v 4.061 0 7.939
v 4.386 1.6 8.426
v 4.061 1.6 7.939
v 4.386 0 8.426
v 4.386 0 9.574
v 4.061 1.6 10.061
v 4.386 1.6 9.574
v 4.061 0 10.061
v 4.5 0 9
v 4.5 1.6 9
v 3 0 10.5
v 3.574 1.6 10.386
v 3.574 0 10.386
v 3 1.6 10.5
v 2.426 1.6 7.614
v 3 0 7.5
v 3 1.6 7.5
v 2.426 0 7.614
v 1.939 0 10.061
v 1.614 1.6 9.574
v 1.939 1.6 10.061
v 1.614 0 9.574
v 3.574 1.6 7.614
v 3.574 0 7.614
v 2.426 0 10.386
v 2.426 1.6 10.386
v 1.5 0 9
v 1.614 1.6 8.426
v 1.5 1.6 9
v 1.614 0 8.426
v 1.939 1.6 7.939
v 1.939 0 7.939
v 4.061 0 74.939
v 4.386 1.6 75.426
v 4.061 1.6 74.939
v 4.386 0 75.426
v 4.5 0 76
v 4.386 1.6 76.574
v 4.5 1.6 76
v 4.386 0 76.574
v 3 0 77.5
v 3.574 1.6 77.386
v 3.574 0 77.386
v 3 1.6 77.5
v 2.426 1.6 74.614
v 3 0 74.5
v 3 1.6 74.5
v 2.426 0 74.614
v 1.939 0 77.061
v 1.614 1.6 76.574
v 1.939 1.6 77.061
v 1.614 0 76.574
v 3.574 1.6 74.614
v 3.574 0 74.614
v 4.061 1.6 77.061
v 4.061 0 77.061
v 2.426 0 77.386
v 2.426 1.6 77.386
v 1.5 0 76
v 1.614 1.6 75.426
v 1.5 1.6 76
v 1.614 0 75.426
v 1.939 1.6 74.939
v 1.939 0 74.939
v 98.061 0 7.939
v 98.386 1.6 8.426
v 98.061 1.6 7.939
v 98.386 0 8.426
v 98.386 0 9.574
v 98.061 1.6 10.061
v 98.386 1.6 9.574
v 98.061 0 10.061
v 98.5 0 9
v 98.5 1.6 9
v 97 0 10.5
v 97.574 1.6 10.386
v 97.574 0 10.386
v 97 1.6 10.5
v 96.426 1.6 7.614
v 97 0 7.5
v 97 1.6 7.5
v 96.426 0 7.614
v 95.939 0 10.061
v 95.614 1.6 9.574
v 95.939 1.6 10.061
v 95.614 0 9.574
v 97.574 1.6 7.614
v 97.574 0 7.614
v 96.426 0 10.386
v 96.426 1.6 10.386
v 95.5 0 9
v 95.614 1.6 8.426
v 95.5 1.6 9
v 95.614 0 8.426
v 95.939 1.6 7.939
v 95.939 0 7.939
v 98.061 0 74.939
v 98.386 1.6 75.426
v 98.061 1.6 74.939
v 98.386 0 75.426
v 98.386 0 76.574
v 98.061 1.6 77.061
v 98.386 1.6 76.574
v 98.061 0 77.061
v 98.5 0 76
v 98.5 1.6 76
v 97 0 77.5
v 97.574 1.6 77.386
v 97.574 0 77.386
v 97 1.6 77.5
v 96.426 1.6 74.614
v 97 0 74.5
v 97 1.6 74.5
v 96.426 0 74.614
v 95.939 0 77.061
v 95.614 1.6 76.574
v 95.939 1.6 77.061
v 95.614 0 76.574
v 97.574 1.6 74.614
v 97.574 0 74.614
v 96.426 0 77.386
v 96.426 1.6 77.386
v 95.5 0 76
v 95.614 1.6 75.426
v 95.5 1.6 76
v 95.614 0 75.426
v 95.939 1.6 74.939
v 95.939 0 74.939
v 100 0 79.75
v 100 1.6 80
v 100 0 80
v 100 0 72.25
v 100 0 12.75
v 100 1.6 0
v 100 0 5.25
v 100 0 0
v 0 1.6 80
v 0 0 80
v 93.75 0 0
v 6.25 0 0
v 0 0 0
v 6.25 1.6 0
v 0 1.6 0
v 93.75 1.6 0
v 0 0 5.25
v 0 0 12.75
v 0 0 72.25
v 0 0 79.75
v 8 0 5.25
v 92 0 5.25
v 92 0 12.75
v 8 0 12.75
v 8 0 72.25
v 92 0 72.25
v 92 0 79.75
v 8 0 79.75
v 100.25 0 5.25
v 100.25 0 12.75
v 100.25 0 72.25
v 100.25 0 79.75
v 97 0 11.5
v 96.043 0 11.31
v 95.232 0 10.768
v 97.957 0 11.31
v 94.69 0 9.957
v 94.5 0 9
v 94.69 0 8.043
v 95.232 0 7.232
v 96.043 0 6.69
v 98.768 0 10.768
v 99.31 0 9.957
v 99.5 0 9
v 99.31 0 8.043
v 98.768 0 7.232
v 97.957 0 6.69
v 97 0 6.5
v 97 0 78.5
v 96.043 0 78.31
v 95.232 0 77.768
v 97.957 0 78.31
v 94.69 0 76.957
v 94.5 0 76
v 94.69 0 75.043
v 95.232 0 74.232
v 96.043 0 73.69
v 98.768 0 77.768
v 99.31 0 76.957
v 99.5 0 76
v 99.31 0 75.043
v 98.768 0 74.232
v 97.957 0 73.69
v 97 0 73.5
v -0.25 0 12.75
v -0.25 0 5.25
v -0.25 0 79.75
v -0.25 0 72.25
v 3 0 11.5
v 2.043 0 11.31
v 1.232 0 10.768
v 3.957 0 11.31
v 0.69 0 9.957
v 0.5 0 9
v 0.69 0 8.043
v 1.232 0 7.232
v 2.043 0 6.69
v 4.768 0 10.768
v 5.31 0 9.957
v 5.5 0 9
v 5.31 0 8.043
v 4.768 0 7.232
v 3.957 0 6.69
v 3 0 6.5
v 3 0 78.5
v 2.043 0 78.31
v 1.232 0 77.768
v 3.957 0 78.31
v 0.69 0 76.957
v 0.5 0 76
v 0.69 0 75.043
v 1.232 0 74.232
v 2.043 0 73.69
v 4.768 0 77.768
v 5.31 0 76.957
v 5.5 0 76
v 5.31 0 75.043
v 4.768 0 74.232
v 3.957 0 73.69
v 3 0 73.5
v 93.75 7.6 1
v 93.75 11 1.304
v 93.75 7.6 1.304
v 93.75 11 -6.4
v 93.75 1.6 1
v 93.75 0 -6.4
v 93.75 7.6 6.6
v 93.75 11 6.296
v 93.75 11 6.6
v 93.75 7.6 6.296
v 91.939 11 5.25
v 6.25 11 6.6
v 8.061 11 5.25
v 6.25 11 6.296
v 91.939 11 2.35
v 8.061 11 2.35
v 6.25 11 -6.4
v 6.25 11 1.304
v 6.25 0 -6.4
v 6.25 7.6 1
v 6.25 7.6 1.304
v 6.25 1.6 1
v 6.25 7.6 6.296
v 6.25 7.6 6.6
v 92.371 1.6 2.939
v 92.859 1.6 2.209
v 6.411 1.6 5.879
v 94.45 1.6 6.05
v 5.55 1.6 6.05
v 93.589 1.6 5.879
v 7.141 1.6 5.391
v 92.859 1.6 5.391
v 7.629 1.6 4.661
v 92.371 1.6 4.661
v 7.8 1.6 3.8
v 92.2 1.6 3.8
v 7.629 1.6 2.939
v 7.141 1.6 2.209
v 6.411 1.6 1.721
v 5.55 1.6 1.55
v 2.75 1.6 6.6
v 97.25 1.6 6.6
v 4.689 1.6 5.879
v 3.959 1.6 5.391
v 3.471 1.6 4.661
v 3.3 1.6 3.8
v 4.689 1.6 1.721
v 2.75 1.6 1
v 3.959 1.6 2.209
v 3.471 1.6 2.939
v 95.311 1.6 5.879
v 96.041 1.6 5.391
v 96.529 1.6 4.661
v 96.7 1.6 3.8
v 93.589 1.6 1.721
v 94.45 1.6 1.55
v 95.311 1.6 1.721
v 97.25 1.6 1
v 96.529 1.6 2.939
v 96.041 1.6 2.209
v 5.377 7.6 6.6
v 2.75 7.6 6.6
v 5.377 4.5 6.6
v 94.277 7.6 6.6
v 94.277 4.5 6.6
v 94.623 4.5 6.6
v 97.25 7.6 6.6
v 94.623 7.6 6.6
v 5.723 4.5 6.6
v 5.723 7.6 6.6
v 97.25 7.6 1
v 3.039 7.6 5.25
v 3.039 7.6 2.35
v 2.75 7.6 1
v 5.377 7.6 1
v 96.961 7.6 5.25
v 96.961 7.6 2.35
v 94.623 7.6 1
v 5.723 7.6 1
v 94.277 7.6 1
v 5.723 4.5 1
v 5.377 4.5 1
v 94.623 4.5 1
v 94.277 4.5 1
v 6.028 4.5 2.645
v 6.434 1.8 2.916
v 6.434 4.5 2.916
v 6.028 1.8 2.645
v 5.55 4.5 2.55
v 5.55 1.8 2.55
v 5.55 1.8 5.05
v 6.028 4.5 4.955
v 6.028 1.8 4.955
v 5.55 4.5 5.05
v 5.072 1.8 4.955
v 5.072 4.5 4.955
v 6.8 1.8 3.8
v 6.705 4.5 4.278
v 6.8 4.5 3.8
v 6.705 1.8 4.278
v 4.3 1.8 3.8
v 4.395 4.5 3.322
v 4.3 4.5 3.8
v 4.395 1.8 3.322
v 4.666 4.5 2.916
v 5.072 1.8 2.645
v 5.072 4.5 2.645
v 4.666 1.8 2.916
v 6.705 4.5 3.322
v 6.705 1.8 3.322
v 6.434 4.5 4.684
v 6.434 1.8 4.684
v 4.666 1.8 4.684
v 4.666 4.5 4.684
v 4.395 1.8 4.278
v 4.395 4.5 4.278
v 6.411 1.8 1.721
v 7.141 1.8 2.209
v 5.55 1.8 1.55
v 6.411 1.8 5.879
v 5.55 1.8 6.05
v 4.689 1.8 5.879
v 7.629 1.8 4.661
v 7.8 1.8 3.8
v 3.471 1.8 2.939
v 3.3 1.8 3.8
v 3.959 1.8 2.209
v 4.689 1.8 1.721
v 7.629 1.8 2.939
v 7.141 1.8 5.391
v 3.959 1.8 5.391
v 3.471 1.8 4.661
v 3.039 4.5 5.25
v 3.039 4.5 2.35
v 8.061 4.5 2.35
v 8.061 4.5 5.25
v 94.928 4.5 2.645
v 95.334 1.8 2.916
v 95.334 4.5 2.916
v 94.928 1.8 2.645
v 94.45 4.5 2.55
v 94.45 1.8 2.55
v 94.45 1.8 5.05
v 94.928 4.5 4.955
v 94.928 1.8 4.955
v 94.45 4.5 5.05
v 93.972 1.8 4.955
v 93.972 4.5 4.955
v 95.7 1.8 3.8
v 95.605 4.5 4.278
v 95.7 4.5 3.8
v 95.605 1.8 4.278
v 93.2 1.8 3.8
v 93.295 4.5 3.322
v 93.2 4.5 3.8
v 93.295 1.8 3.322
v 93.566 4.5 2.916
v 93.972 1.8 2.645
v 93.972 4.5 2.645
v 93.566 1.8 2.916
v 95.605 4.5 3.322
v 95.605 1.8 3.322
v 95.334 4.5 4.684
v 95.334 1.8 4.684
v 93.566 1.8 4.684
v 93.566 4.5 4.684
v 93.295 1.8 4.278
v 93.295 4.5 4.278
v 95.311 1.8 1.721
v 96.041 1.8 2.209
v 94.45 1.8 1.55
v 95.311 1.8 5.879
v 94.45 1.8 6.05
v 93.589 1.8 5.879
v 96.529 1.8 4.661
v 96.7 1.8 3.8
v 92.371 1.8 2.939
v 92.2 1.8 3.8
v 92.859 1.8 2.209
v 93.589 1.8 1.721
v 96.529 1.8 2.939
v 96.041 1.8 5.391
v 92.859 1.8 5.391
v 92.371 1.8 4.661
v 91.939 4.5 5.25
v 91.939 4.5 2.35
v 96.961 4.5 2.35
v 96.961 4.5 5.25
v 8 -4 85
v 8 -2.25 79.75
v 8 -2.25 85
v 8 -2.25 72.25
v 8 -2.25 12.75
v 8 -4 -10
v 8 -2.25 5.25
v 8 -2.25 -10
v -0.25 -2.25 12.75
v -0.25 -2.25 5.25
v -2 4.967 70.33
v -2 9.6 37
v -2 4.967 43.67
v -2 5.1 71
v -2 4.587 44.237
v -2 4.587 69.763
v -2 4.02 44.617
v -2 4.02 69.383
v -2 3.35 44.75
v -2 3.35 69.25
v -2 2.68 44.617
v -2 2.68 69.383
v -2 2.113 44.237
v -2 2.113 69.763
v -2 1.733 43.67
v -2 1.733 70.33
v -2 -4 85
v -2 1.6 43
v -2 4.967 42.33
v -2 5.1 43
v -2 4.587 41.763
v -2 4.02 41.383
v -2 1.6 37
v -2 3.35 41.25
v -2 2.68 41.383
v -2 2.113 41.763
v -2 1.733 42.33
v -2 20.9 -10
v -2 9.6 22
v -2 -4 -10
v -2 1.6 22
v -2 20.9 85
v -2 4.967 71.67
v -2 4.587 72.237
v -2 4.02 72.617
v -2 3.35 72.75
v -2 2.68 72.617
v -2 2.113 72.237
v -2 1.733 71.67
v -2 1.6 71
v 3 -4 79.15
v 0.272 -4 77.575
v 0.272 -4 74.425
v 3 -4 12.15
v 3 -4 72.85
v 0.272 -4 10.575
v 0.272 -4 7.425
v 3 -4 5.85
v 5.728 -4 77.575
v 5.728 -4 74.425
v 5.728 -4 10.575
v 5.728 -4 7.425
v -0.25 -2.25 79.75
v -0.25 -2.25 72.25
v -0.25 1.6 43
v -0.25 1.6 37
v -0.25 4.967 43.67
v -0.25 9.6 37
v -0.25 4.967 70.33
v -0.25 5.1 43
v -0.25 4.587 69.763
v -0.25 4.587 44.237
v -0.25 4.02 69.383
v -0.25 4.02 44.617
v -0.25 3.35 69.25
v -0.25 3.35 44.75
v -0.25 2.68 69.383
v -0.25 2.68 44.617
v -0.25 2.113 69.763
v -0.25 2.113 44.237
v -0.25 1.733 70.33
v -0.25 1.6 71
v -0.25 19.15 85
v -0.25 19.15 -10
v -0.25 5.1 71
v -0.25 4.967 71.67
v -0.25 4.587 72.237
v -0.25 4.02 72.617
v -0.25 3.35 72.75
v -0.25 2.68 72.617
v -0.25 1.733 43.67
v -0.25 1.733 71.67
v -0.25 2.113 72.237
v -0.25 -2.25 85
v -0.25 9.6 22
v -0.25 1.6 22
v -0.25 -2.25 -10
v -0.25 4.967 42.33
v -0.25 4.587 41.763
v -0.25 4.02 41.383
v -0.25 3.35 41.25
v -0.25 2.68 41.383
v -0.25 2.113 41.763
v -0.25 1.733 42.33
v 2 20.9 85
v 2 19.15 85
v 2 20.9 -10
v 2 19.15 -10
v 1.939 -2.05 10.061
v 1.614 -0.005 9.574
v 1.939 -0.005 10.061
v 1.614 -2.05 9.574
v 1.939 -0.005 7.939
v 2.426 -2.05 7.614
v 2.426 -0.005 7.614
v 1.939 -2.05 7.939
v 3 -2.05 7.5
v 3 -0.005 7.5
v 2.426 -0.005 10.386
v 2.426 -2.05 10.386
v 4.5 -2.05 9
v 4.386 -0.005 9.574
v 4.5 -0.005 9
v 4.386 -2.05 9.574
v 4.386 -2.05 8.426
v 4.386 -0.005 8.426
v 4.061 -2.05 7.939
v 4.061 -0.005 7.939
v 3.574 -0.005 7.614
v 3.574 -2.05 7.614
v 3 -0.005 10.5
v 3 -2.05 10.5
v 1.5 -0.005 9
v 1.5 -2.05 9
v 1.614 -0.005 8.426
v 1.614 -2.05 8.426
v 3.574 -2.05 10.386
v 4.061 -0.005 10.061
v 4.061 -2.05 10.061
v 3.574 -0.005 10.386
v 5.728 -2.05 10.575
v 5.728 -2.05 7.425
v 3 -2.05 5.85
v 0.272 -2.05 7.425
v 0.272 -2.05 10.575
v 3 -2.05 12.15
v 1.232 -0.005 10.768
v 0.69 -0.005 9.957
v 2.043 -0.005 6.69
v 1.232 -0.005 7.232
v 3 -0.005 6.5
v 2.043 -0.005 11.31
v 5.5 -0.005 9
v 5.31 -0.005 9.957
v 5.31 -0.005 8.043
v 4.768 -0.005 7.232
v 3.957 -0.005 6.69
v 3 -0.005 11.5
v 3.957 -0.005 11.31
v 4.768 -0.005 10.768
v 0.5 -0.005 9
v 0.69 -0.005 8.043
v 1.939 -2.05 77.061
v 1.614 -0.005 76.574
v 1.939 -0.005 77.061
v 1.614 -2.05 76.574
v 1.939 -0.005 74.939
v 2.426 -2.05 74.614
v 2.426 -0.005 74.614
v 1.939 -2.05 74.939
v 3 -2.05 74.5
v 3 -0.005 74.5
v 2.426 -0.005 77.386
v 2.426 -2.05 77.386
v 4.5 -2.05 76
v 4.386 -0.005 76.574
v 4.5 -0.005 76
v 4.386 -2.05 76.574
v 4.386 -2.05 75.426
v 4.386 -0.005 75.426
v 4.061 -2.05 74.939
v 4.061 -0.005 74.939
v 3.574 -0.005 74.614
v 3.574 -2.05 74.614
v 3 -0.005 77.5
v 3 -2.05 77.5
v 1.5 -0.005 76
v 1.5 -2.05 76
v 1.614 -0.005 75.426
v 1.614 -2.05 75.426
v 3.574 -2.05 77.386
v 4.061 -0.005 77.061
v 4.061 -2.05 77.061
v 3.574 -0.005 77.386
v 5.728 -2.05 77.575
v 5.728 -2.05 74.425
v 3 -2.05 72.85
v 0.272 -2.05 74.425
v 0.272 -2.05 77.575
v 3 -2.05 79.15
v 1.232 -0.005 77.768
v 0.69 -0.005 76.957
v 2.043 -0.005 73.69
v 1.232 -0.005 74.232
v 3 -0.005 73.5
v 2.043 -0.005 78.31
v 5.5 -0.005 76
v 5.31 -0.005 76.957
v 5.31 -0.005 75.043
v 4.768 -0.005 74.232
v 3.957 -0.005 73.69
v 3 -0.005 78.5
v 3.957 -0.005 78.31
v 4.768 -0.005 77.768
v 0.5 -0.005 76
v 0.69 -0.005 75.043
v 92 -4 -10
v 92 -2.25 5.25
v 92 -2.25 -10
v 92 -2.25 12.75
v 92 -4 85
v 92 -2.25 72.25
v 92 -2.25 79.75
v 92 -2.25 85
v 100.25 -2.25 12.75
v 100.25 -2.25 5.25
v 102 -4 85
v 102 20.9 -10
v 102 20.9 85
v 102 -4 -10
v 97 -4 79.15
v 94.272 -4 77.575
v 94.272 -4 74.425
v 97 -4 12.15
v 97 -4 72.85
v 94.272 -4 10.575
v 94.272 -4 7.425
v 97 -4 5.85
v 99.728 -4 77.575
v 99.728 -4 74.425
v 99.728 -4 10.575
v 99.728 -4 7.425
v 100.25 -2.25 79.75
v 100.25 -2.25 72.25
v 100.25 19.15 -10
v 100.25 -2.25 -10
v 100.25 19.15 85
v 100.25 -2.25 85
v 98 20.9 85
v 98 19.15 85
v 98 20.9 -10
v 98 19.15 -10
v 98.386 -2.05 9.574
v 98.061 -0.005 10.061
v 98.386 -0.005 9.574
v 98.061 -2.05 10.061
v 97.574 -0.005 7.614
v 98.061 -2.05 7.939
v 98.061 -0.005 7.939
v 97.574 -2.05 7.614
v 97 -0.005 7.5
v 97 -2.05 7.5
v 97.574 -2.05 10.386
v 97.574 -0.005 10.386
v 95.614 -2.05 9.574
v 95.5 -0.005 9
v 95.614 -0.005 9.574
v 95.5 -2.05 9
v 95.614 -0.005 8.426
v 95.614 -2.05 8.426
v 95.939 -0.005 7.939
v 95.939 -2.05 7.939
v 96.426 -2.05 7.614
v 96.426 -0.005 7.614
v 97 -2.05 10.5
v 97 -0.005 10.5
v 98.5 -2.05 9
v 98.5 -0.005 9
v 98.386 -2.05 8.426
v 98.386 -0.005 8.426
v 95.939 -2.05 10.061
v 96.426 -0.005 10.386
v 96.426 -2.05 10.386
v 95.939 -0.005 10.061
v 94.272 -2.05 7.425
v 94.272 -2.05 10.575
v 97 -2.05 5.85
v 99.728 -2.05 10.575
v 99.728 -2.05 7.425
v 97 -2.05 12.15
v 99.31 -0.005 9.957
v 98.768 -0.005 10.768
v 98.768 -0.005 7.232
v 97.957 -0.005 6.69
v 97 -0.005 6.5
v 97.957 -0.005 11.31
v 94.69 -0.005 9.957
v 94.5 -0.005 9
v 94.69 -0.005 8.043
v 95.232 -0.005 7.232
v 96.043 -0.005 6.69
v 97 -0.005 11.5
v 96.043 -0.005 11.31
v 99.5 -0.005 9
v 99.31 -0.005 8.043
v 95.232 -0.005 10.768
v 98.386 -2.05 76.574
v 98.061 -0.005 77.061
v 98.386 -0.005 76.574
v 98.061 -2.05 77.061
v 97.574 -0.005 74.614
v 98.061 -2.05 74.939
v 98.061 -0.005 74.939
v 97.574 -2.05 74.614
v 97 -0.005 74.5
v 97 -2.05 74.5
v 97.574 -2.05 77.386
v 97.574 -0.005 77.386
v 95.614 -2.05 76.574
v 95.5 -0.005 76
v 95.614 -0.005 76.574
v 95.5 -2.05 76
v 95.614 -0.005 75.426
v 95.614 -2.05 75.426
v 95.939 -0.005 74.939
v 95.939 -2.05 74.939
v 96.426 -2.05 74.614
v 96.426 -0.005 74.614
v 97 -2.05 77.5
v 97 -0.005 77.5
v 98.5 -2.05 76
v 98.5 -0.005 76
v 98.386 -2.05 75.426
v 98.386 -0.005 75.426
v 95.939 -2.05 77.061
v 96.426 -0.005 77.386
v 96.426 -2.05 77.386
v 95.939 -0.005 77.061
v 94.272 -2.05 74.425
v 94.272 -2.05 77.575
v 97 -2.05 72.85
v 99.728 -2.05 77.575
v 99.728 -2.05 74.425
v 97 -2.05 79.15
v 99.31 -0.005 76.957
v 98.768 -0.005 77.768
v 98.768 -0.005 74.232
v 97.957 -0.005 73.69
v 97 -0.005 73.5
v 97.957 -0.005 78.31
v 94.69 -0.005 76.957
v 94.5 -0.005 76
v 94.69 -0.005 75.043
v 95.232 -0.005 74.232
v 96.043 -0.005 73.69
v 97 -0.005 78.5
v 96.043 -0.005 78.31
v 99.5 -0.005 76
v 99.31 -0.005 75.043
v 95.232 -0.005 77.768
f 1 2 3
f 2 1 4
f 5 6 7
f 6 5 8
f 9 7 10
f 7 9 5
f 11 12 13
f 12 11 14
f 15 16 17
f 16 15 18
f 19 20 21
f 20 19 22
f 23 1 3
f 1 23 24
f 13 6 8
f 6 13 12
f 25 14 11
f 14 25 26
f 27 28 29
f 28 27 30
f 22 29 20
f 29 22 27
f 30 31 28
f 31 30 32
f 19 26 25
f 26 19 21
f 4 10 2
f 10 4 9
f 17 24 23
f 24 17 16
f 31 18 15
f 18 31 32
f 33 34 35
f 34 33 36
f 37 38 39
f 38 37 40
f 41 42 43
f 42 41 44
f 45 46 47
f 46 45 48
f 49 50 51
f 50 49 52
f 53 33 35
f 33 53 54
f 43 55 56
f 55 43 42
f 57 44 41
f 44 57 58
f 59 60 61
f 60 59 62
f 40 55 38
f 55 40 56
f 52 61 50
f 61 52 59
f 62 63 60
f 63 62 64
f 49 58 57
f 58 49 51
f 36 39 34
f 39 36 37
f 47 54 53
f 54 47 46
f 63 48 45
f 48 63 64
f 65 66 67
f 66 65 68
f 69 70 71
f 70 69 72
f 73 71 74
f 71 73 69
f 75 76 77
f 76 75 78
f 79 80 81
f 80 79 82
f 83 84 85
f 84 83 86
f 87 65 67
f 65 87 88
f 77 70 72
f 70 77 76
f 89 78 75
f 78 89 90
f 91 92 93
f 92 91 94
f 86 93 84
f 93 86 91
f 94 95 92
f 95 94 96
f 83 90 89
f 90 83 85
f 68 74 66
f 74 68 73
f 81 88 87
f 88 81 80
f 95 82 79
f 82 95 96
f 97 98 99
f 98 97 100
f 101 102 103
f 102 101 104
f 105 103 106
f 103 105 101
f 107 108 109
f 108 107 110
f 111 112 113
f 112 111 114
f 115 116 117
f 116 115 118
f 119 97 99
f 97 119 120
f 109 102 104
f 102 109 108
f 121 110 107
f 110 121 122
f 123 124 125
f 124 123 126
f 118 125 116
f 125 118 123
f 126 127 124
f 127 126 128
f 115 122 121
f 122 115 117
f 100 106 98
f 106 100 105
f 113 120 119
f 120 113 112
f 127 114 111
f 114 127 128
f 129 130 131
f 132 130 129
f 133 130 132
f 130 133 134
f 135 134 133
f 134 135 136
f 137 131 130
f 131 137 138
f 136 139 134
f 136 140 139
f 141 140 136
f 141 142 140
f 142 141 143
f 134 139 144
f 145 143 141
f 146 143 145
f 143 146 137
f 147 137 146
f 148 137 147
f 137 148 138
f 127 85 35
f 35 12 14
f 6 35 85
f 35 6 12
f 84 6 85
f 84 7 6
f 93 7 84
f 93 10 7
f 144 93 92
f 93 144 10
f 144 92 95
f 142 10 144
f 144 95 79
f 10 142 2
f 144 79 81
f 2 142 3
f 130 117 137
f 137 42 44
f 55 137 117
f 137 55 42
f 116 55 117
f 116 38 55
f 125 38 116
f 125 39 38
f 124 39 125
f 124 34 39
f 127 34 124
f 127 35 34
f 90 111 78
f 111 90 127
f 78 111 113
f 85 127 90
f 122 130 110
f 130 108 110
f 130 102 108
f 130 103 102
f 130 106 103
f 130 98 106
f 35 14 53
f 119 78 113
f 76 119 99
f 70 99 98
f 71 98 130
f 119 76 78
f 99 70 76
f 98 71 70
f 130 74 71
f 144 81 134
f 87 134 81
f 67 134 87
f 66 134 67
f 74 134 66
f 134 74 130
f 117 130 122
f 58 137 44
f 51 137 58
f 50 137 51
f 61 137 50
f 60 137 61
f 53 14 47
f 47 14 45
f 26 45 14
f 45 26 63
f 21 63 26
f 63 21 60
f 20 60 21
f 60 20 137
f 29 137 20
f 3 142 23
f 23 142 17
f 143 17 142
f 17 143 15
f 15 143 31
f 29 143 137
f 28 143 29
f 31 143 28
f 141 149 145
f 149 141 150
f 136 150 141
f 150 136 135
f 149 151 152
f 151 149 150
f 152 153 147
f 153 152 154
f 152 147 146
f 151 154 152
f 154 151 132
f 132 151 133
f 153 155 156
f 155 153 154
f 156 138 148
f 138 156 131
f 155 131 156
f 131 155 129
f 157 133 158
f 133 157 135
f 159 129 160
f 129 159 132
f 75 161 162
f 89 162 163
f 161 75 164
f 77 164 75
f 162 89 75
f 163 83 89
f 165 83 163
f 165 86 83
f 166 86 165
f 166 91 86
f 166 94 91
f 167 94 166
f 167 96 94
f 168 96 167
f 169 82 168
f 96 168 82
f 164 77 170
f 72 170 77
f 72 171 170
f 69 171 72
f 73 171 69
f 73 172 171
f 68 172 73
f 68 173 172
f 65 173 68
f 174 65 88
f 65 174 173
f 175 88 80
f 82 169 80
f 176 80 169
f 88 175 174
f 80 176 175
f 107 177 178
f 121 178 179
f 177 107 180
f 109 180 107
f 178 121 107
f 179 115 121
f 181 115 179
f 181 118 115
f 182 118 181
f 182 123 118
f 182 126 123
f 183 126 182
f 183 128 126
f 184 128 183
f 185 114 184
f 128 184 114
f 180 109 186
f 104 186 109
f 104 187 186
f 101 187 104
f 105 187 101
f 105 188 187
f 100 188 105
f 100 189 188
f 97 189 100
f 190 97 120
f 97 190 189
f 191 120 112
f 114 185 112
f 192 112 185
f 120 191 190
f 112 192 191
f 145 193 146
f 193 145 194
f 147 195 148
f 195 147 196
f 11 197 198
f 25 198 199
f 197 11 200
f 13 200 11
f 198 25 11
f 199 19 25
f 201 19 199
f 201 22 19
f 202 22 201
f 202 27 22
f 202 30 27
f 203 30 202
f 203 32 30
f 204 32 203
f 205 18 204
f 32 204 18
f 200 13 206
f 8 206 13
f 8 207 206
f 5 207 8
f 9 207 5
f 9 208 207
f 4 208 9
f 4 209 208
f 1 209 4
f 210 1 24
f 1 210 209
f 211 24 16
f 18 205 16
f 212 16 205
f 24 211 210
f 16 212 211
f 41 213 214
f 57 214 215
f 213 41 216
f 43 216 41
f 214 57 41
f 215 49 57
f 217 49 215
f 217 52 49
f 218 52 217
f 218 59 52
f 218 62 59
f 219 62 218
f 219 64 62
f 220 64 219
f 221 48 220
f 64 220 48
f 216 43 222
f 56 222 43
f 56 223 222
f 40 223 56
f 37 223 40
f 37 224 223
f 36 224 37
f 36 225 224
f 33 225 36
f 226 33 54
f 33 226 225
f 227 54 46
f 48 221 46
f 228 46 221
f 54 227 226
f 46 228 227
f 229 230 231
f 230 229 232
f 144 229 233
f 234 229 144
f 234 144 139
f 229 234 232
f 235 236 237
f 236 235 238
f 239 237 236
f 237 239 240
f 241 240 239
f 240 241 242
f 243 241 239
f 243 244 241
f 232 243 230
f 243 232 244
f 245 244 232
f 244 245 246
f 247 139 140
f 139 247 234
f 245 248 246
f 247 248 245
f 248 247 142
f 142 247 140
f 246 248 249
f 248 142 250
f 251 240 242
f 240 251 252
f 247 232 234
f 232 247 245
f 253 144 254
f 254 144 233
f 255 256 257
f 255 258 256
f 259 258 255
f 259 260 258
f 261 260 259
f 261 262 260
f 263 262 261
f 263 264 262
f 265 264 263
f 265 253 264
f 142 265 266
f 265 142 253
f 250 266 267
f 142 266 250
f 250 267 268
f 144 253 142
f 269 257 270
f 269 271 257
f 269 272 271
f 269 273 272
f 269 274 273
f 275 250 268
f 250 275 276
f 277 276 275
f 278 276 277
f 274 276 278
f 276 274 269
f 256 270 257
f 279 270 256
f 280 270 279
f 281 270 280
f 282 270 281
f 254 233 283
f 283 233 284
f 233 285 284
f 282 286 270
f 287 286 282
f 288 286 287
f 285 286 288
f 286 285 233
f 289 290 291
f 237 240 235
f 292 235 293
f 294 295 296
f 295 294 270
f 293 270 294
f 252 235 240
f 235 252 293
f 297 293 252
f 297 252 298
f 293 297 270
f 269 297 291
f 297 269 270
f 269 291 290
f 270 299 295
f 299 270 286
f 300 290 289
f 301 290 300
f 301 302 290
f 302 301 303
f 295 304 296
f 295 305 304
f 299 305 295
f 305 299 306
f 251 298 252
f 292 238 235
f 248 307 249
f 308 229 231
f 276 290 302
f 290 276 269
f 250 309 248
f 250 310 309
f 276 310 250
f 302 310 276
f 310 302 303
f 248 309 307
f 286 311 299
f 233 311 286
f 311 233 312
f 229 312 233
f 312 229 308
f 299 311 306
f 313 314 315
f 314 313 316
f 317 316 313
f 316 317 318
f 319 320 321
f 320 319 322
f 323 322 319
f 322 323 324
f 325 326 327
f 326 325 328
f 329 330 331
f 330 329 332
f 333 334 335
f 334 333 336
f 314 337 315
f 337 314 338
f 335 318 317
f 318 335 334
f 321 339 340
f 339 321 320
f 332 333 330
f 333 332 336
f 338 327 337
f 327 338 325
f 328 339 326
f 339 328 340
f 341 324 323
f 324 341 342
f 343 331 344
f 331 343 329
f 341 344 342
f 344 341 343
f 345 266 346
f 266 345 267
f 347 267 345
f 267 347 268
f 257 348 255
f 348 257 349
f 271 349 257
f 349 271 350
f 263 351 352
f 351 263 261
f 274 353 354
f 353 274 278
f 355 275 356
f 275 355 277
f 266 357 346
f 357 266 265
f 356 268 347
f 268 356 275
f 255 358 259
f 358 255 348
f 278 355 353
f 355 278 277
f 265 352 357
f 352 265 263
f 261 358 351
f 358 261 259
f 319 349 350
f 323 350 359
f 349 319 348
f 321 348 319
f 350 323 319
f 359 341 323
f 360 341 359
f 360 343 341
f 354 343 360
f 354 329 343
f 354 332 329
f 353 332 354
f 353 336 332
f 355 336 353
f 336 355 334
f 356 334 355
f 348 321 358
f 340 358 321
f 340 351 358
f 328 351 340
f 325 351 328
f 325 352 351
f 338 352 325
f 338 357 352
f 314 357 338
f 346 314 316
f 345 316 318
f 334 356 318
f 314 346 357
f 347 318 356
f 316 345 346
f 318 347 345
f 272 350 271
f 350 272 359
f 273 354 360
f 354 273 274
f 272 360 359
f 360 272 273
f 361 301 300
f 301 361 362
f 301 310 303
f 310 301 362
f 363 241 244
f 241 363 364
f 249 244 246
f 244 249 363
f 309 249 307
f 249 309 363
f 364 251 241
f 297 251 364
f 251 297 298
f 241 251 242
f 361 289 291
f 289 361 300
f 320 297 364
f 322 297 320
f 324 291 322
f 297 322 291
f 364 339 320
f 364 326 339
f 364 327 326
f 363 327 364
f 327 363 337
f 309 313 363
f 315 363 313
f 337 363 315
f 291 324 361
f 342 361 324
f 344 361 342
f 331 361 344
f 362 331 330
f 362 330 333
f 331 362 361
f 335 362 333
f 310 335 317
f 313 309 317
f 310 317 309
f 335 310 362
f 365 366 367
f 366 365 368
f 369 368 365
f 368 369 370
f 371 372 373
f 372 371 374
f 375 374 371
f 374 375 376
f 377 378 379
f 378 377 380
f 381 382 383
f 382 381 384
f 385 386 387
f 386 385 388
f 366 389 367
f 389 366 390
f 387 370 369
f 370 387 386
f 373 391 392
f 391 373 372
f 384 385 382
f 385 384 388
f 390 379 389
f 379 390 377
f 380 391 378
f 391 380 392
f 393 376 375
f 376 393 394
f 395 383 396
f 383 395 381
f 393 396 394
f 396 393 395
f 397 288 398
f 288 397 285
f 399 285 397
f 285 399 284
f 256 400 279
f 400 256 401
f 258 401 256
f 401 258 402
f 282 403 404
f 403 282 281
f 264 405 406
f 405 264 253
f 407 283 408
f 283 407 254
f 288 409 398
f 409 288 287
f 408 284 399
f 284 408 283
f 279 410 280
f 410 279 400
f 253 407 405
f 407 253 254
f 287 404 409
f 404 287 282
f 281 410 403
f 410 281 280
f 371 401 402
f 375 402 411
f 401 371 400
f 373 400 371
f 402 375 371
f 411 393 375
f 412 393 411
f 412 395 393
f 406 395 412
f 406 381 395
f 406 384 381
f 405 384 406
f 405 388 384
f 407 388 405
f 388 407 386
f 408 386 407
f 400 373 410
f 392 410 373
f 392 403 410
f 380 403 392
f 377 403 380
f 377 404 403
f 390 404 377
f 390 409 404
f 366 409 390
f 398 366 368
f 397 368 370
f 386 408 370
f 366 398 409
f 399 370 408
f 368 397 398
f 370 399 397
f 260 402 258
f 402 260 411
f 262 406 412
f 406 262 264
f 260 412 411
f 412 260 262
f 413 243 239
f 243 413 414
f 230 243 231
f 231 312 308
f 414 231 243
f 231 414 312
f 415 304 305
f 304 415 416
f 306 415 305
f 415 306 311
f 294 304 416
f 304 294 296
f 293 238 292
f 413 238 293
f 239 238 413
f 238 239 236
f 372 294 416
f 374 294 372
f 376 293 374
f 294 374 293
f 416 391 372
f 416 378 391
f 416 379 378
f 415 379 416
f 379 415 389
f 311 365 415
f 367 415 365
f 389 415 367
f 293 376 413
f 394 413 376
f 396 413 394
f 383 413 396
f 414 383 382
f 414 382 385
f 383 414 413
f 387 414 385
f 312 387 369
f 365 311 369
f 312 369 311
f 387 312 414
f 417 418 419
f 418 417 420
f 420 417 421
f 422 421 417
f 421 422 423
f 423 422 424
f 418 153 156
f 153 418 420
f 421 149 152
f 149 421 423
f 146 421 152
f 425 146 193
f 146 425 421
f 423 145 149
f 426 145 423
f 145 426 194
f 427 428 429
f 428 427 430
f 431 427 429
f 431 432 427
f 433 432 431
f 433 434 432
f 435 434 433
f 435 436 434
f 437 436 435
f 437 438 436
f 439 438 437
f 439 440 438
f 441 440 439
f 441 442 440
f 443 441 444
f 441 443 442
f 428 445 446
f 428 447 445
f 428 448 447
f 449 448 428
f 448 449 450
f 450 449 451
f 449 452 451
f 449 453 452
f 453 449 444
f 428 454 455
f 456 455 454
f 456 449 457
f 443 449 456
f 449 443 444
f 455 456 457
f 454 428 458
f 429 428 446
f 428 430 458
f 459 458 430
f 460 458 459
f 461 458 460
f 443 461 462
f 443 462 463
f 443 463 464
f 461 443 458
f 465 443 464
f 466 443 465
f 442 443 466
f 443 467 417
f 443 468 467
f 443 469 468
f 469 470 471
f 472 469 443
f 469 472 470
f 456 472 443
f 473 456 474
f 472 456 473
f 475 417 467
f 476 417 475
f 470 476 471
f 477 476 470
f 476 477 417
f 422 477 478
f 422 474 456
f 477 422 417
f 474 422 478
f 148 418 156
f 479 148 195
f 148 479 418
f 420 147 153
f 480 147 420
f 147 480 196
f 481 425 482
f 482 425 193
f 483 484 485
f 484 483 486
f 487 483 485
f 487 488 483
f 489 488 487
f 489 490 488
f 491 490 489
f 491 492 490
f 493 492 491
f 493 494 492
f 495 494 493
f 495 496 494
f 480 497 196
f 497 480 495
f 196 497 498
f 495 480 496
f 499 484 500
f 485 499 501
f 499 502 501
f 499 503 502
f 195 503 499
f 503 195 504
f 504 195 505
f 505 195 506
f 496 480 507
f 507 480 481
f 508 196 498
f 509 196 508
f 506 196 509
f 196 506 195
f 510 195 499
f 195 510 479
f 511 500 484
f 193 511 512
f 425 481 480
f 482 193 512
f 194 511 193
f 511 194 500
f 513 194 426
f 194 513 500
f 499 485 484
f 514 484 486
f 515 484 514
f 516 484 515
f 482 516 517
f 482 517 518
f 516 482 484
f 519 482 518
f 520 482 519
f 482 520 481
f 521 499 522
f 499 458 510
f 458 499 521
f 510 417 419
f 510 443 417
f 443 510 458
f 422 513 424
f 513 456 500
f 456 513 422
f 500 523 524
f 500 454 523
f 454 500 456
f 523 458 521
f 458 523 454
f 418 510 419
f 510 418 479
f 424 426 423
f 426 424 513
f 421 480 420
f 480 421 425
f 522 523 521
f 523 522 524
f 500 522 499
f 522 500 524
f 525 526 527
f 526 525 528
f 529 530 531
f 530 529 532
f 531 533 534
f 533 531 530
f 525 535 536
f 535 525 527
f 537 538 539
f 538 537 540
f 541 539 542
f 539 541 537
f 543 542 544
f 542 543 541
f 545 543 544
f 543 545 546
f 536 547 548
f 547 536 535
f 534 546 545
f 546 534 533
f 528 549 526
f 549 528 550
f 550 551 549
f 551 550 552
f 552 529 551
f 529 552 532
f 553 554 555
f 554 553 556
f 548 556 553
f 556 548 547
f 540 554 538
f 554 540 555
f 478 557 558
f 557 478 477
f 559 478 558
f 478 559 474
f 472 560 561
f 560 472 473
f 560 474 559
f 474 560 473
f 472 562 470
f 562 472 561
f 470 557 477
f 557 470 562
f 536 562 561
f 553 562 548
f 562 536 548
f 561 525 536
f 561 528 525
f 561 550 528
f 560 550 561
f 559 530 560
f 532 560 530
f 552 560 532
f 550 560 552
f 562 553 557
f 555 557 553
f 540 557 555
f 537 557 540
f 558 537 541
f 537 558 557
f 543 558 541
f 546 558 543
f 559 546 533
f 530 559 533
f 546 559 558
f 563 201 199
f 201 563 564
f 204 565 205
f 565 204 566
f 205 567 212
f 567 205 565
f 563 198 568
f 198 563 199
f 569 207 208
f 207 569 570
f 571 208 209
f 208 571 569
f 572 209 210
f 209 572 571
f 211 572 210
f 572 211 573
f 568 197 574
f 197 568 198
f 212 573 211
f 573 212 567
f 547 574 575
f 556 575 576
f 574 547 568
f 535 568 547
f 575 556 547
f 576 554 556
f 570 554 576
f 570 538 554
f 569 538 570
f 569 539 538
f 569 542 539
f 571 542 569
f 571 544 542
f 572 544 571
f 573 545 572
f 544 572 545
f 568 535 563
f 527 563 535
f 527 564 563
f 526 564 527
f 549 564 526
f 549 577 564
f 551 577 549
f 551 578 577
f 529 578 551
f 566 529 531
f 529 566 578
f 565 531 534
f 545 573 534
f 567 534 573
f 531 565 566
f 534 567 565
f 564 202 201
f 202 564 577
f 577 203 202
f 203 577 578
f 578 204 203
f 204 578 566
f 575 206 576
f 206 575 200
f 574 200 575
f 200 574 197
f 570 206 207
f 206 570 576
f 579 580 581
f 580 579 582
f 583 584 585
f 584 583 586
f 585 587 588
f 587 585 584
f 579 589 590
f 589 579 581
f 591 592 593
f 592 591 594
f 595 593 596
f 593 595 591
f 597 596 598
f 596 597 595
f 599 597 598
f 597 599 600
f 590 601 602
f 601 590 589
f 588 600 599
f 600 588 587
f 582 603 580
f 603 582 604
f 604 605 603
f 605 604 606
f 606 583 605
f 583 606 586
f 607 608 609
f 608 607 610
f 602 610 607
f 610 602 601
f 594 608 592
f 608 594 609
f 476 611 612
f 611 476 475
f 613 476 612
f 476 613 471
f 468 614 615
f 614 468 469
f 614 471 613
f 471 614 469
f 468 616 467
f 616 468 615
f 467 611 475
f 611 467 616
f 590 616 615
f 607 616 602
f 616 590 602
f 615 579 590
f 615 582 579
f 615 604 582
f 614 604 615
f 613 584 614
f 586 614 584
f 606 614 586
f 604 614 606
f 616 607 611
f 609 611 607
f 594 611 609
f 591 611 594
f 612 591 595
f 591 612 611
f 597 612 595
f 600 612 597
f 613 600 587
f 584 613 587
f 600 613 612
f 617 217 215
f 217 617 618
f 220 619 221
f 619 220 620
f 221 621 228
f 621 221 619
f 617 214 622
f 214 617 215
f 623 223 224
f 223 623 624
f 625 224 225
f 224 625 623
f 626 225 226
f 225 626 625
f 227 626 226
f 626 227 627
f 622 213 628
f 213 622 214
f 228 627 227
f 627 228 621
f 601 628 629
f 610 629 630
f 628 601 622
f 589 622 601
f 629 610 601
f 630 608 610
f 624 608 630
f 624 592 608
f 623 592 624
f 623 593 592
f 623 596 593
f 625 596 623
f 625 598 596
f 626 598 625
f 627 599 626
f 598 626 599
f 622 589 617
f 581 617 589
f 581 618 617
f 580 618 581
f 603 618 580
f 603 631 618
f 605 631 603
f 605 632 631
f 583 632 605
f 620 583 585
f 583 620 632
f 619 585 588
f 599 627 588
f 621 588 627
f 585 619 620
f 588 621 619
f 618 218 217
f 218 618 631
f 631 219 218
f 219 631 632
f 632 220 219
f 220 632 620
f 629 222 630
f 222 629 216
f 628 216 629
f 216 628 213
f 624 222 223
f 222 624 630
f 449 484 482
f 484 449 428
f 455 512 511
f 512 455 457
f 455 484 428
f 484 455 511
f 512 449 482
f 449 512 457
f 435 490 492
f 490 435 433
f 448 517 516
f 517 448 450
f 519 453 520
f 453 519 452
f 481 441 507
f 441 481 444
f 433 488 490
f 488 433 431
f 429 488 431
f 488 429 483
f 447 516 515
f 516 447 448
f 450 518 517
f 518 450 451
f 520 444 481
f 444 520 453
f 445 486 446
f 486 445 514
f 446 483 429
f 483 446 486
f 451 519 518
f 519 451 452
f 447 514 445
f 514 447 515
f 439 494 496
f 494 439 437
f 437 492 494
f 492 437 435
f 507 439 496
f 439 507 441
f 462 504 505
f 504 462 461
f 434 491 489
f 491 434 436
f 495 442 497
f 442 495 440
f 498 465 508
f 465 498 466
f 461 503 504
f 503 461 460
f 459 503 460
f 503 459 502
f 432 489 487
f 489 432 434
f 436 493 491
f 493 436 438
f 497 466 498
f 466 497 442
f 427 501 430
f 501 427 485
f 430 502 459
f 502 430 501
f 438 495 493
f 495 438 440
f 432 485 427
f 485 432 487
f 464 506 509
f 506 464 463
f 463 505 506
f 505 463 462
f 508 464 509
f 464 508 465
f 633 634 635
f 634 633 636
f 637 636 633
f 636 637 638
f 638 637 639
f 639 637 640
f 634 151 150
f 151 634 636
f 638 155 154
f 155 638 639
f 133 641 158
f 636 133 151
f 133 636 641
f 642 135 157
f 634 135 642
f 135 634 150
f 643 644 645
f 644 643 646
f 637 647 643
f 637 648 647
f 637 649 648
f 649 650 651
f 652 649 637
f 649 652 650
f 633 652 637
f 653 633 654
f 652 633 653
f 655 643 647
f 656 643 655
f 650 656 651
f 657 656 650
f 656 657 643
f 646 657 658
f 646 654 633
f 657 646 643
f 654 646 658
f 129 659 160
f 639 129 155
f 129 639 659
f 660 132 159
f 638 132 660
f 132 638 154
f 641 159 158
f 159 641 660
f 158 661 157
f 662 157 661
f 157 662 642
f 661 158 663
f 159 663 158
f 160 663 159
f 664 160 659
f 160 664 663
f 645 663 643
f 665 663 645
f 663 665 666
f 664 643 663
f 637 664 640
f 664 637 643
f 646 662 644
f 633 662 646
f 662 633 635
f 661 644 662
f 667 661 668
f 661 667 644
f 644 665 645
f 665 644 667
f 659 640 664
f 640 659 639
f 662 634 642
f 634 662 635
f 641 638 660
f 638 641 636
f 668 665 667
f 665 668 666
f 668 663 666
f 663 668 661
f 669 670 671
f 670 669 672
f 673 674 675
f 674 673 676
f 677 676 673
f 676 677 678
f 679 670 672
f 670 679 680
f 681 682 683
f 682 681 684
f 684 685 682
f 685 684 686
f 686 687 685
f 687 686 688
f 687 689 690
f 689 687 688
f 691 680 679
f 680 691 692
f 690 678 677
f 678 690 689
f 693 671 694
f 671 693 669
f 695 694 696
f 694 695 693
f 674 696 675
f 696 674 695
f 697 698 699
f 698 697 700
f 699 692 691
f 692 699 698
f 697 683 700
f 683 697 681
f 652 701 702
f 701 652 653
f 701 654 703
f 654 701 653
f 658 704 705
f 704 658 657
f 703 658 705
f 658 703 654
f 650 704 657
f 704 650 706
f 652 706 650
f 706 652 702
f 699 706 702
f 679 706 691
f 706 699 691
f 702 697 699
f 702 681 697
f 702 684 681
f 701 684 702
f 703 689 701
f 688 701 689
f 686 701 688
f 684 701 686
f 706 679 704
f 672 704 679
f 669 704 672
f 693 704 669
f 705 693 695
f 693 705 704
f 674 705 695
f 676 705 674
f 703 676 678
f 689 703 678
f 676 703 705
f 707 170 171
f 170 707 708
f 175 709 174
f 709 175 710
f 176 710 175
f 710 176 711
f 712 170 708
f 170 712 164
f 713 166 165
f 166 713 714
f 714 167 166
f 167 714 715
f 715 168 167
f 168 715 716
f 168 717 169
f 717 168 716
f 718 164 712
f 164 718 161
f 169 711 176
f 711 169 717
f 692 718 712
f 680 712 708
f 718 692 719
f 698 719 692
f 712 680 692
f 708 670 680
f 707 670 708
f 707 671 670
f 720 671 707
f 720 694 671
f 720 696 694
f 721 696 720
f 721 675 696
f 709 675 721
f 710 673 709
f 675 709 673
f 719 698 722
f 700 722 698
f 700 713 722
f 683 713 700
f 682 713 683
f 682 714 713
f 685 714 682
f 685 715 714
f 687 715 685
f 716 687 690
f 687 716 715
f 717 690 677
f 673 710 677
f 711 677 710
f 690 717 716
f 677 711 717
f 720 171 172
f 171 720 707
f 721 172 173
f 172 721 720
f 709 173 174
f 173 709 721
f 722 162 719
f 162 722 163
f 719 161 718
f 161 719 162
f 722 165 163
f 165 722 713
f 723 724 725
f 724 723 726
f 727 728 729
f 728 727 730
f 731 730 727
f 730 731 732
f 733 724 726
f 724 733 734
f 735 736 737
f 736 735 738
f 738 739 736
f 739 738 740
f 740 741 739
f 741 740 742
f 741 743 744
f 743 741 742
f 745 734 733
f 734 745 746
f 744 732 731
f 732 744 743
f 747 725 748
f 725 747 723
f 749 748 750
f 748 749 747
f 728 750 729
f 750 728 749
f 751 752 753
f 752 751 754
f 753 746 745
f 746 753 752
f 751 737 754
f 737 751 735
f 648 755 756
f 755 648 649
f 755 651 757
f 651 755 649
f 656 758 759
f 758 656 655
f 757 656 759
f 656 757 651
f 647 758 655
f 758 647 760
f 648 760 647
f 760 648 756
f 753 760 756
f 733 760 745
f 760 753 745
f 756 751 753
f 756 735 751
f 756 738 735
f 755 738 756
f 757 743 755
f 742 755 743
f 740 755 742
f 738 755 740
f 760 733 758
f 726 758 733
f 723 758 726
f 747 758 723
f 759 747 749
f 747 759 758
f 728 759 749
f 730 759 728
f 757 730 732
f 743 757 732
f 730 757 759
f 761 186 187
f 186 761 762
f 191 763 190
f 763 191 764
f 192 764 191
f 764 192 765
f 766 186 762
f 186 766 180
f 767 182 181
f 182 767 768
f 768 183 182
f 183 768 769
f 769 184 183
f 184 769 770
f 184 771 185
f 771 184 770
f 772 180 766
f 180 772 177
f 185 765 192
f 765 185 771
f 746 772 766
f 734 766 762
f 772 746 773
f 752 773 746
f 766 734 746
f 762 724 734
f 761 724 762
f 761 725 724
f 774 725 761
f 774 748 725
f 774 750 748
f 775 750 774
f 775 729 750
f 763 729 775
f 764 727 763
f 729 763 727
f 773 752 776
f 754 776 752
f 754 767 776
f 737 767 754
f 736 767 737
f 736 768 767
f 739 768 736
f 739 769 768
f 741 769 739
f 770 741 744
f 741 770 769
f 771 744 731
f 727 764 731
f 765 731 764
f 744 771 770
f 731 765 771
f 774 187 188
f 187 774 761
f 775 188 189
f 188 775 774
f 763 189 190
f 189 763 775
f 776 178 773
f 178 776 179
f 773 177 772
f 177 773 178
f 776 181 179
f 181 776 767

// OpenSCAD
// file: ../library/din41612/din41612_male.scad
// din41612 male connector
// =======================

include <din41612_male_dim.scad>

use <../linurs/linurs_screw.scad>

module din41612_male(){ 
  // color("LightGrey")
  difference(){
    union(){
        translate([0,din41612_male_w1/2,din41612_male_h/2-din41612_male_h1])  
        cube([din41612_male_l1,
              din41612_male_w1,
              din41612_male_h],
             center=true);  
      translate([0,(din41612_male_w1-din41612_male_w)/2,(din41612_male_h-din41612_male_h1)/2]) 
        cube([din41612_male_l1,
              (din41612_male_w-din41612_male_w1),
              din41612_male_h-din41612_male_h1],
             center=true);  
      translate([0,din41612_male_w2/2+din41612_male_w1-din41612_male_w,din41612_male_h2/2])
        cube([din41612_male_l,
              din41612_male_w2,
              din41612_male_h2],
             center=true);  
    }
    for(i=[-1,1]){ // mounting holes
      translate([i*din41612_male_dl/2,
                 din41612_male_w1-din41612_male_w+din41612_male_w2/2, 
                 din41612_male_h1])
      rotate([180,0,90])screw_fix(
            w=din41612_male_h2, 
            d=M2_5, 
            type=head_cyl, 
            nut_sink=din41612_male_h,
            t=0);
    }
  }
}
din41612_male();  
// file: ../library/din41612/din41612_male_dim.scad
include <../linurs/linurs_screw_dim.scad>

// connector dimensions
din41612_male_l=94.5;    // lenght of the connector
din41612_male_l1=87.5;   // 
din41612_male_w=13;      // width of the connector
din41612_male_w1=6.4;    // 
din41612_male_w2=5.6;    // 
din41612_male_h=11;      // height of the connector
din41612_male_h1=1.6;    // 
din41612_male_h2=6;      // 

din41612_male_dl=88.9;   // distance between mounting holes
// file: ../library/din41612/din41612_female_dim.scad
include <../linurs/linurs_screw_dim.scad>

// connector dimensions
din41612_female_l=95;       // lenght of the connector
din41612_female_l1=85;      // lenght of the connector head
din41612_female_h=11.6;     // height of the connector
din41612_female_h1=5.2;     // height produced by the connector when pulgged in 
din41612_female_w=11;       // width of the connector
din41612_female_w1=8.5;     // width of the connector head

din41612_female_dl=90;      // distance between mounting holes
// file: ../pcb/pcb.scad
// pcb
// ===
// The pcb is the master object and has its 
// lower left corner solder side at the origin of the 
// coordinate system 

n=2;  // [1,2,3,4,5,6,7,8]
show_pcb="assemblies"; // [assemblies,assembly,pcb]

include <pcb_dim.scad>
include <../motherboard/motherboard_dim.scad>

use <../library/din41612/din41612_male.scad>

module pcb(){
  echo("pcb");  
  color("greenyellow")
  difference(){
    cube([pcb_l,pcb_h,pcb_w]); // pcb
    for(x=[-1,1]){ // mounting holes
      for(y=[pcb_wd1,pcb_wd1+pcb_wd]){
        translate([x*pcb_ld/2+pcb_l/2,0,y])
        rotate([90,0,0])
        cylinder(d=pcb_d,h=3*pcb_h,center=true,$fn=16);
      }
    }
  }
}

module pcb_assembly(){
  echo("pcb assembly");  
  pcb();  
  translate([pcb_l/2,pcb_h,0])  
  rotate([-90,0,0])din41612_male();  
}

module pcb_assemblies(n=1){
  echo("pcb assemblies"); 
  for(i=[0:n-1]){ // add the connectors
      echo(i);
      translate([0,step*i,0])
      pcb_assembly();
  }    
}    

if(show_pcb=="assemblies"){
  pcb_assemblies(n=n);
}

if(show_pcb=="assembly"){
  pcb_assembly();
}

if(show_pcb=="pcb"){
    // Move to center to create 2D drawings from top view 
    // with script OpenSCAD22d.py
    //
    rotate([90,0,180])
    //
    translate([-pcb_l/2,-pcb_h/2,-pcb_w/2])
    pcb();
}
// file: ../bracket/bracket.scad
// bracket
// =======
// A bracket of the elecbox module
// - type: 0 front bracket, 1 rear bracket
// - width 1..n in steps

// parameters for customizer
// bracket width
n=2; // [1,2,3,4,5,6,7,8]
// type
bracket="Front"; // [Front,Back]
// intermediate mounting holes
intermediate=false;  

include <../pcb/pcb_dim.scad>

include <../motherboard/motherboard_dim.scad>
include <../library/linurs/linurs_screw_dim.scad>
include <bracket_dim.scad>

use <../library/linurs/linurs_screw.scad>
    
module back_bracket(n=1, intermediate=false){
  mirror([1,0,0])       // mirror it if desired
  front_bracket(n=n, intermediate=intermediate); 
}
    
module front_bracket(n=1, intermediate=false){
  echo("bracket");  
  //color("White")
  intermediatestep=(intermediate)?step:0; 
  difference(){
    union(){
      translate([-bracket_h2/2-bracket_gap/2,
                 bracket_w(n)/2-bracket_w1,
                 bracket_l/2])  
      cube([bracket_h2,
            bracket_w(n),
            bracket_l],center=true); // create the bracket front
  
      translate([bracket_h/2-bracket_h2-bracket_gap/2,
                 bracket_t/2-bracket_w1,
                 bracket_l/2]) 
      cube([bracket_h,
            bracket_t,
            bracket_l],center=true); // U shape side of the screw
      
      translate([bracket_h1/2-bracket_h2-bracket_gap/2,
                 bracket_w(n)-bracket_w1-bracket_t/2,
                 bracket_l/2]) 
      cube([bracket_h1,
            bracket_t,
            bracket_l],center=true); // U shape where no screw  
      for(x=[1:n]){  // create the mounting hole cubes 
        for(z=[bracket_l1,
               bracket_l1+bracket_ld]){
          translate([ bracket_h/2-bracket_h2-bracket_gap/2,
                     -bracket_w1/2+(x-1)*intermediatestep,
                     z])
          cube([bracket_h,
                bracket_w1,
                bracket_l2],center=true);
        }
      }   
    }
    for(x=[1:n]){ // create the mounting hole 
      for(z=[bracket_l1,
             bracket_l1+bracket_ld]){
        translate([bracket_h3-bracket_h2-bracket_gap/2,
                  -bracket_w1/2+(x-1)*intermediatestep,
                   z])
        rotate([0,90,0])
        rotate([-90,0,0])
        screw_fix(w=bracket_w1,d=bracket_screw,type=head_no, t=bracket_screw_gap);
      }
    }
  }
}

if(bracket=="Front"){
  front_bracket(intermediate=intermediate,n=n);
}

if(bracket=="Back"){
  back_bracket(intermediate=intermediate,n=n);
}
// file: ../library/linurs/linurs_screw.scad
// Metric screws and nuts 
// urs@linurs.org 2019
// It is targeted for 3D printing applications. 
// To look realistic is not the goal (Example: Nuts do not have a hole)

include <linurs_screw_dim.scad>

d=0; //[0:M2_5,1:M3,2:M4,3:M5]
type=0;//[0:head_cyl,1:head_cnt,2:head_no,3:head_hex]
w=15; 
i=10;
nut_sink=0;
screw_sink=0; 
t=0.01;
fn=16;

/* [hex_bolt] */
show_hex_bolt=false;

/* [nut] */
show_nut=false;

/* [screw] */
show_screw=false;

/* [screw_fix] */
show_screw_fix=false;

/* [screw_cut] */
show_screw_cut=false;

/* [nut_cut] */
show_nut_cut=false;
wi=0; 
rot=false;

// functions used multiple times to position nuts and heads
function headh_cyl(d)=screw_cyl[d][1];  // height of cyl screw head
function headh_cnt(d)=screw_cyl[d][1];  // height of cnt screw head
function headh(d,type=head_cyl)=(type==head_cyl ? headh_cyl(d) : (type==head_cnt ? headh_cnt(d) : 0 )); // height of screw head 

function nuth(d)=screw_hex[d][2];   // height of hex nut

// head of a cylinder screw
module screw_head_cyl(d=M3, t=0)
{
  screwhd=screw_cyl[d][0]+t; // diameter of cylinder screw head
  cylinder(d=screwhd,h=headh(d=d, type=head_cyl), center=true,$fn=16); // screw head
}

// head of a countersunk screw
module screw_head_cnt(d=M3, t=0)
{
  screwd=screw_d[d]+t; 
  screwhd=screw_cnt[d][0]+t; // diameter of cylinder screw head
  cylinder(d1=screwd,d2=screwhd,h=headh(d=d,type=head_cnt), center=true,$fn=16); // screw head
}

// head of a hex screw
module screw_head_hex(d=M3, t=0)
{
    translate([0,0,-nuth(d)/2])nut(d=d, t=t);
}

// head of all screws
module screw_head(d=M3, type=head_cyl, t=0)
{ 
  if(type==head_cnt){
    screw_head_cnt(d=d, t=t);
  } else {
    if(type==head_cyl){
      screw_head_cyl(d=d, t=t);
    } else {
       if(type==head_hex){
           screw_head_hex(d=d, t=t); 
       } 
    }    
  }
}

// hex bolt 
module hex_bolt(d=M3, w=10, t=0)
{
  nutd=screw_hex[d][1]+t; // outer diameter of hex bolt
  cylinder(r=nutd/2,h=w+t, center=true,$fn=6); // nut
}

// nut 
module nut(d=M3, t=0)
{
  hex_bolt(d=d, w=nuth(d), t=t);    
}

// screw 
// w outer width of the screw = screw length + head 
module screw(w=10, d=M3, type=head_cyl, t=0){
  screwd=screw_d[d]+t;       // screw diameter
  cylinder(d=screwd, h=w, center=true,$fn=16); // screw thread length
  translate([0,0,w/2-headh(d=d,type=type)/2])
  screw_head(d=d,type=type, t=t);
}

// screw fix
// w outer width of the screw = screw length + head 
// sink additional material below to remove 
// raise additional material above to remove
module screw_fix(w=10, d=M3, type=head_cyl, screw_sink=0, nut_sink=0, t=0){
  screw(w=w, d=d, type=type, t=t);
  translate([0,0,-w/2+nuth(d)/2])
    nut(d=d,t=t);
  //additional material to be removed above the nut  
  translate([0,0,-(w+nut_sink)/2])hex_bolt(d=d,w=nut_sink+0.01,t=t);    
  //additional material to be removed above the screw head
  if(type==head_cnt){  
    translate([0,0,w/2+screw_sink])
    cylinder(d=screw_cnt[d][0]+t,h=screw_sink+0.01,center=true,$fn=16);
  }else{ 
    translate([0,0,(w+screw_sink)/2])
    cylinder(d=screw_cyl[d][0]+t,h=screw_sink+0.01,center=true,$fn=16);
  }     
}

// screw cut
// material to be extracted from object to slide in a counter sunk screw for fixation
// w height of the cut out
// i depth of the screw
module screw_cut(d=M3,w=20,i=10,t=0,fn=32){
    hsh=screw_cnt[d][1];
    ws=screw_cnt[d][0]+t;
    ds=screw_d[d]+t;
    
    translate([i/2,0,-(w-hsh)/2])
      cube([i,ws,hsh],center=true);
    
    translate([0,0,-(w-hsh)/2])
      cylinder(d=ws,h=hsh,center=true,$fn=32);
    
    translate([0,0,-(w-hsh)/2+hsh])
        cylinder(d2=ds, d1=ws, h=hsh,center=true,$fn=fn);
    
    cylinder(h=w, d=ds, center=true, $fn=fn);   
    
    translate([i/2,0,0]) 
        cube([i,ds,w],center=true);
    
    for(y=[-1,1]){
        translate([i/2,y*ds/2,-w/2+hsh])
            rotate([45,0,0])
            cube([i,sqrt(2)*(ws-ds)/2,sqrt(2)*(ws-ds)/2],center=true);
    }
}
//screw_cut();

// nut cut
// material to be extracted from object to slide in a nut for fixation
// w height of the cylinder
// i lenght of the inlet
module nut_cut(w=10, wi=0, d=M3, i=10, t=0, rot=false,type=head_cyl){ 
  r=(rot)?90:0;
  ds=(rot)?screw_hex[d][1]:screw_hex[d][0];
  rotate([0,0,r])nut(d,t);
  translate([i/2,0,0])
    cube([i,ds+t,nuth(d)+t],center=true);
  translate([0,0,-wi])
      if(type==head_cnt){    
          screw(w=w, d=d, type=type, t=t); 
        translate([0,0,w/2])
          cylinder(d=screw_cnt[d][0]+t,h=raise,center=true,$fn=16);
      }
      else{ 
          screw(w=w, d=d, type=type, t=t);   
  //      translate([0,0,0])
          //#cylinder(d=screw_cyl[d][0]+t,h=w,center=true,$fn=16);
      }       
}

if(show_hex_bolt==true){
   hex_bolt(d=d, w=w, t=t);
}

if(show_nut==true){
  nut(d=d, t=t);
}    

if(show_screw==true){
   screw(w=w, d=d, type=type, t=t);
}

if(show_screw_fix==true){
  screw_fix(w=w, d=d, type=type, nut_sink=nut_sink, screw_sink=screw_sink, t=t);
}

if(show_screw_cut==true){
  screw_cut(d=d,w=w,i=i,t=t,$fn=fn);
}    

if(show_nut_cut==true){
  nut_cut(w=w, wi=wi, d=d, i=i, t=t,rot=rot,type=type);
}  
// file: ../library/linurs/linurs_screw_dim.scad
// Metric screws and nuts 
// urs@linurs.org

// contains dimensions of linurs_screw and can be included in other 
// OpenScad files 

// Parameters in this file
// d screw diameter M2_5, M3, ... (enumeration with screw_d)
// t millimeters added to diameters 

// enumerations of metric threads
M2_5=0;
M3=1;
M4=2;
M5=3;

// enumerations screw head type
head_cyl=0; // cylinder
head_cnt=1; // countrsunk
head_no=2;  // no head at all
head_hex=3;  // no head at all

// screw diameters
screw_d=[
2.5, // M2.5
3.0, // M3
4.0, // M4
5.0  // M5
];

// sizes for hex nuts
screw_hex=[
//   s,   e,   h
 [ 5.0, 5.8, 1.7], // M2.5
 [ 5.5, 6.4, 2.0], // M3
 [ 7.0, 8.1, 2.8], // M4
 [ 8.0, 9.2, 3.5]  // M5
];

// sizes for cylinder screw heads
screw_cyl=[
//   d,   h
 [ 4.5, 1.6], // M2.5
 [ 5.5, 2.0], // M3
 [ 7.0, 2.6], // M4
 [ 8.5, 3.3]  // M5
];

// sizes for countersunk screw heads
screw_cnt=[
//   d,   h
 [ 4.7, 1.50], // M2.5
 [ 5.6, 1.65], // M3
 [ 7.4, 2.20], // M4
 [ 9.2, 2.50]  // M5
];
// file: ../motherboard/motherboard_dim.scad
include <../library/linurs/linurs_screw_dim.scad>
include <../library/din41612/din41612_female_dim.scad>
include <../library/din41612/din41612_male_dim.scad>
include <../pcb/pcb_dim.scad>
// motherboard pcb dimensions
motherboard_l=pcb_l;   // pcb width
motherboard_h=1.6;     // pcb thickness
step=25.4;             // distance between modules

function motherboard_w(n)=din41612_female_w+step*(n-1);

screw_motherboard_d=M2_5;
screw_motherboard_l=16;
motherboard_pass=0.5;// gap to fit screws 

motherboard_z_offset=-din41612_male_w1-din41612_female_h1-motherboard_h;
// file: ../bracket/bracket_dim.scad
// bracket

include <../pcb/pcb_dim.scad>
include <../motherboard/motherboard_dim.scad>
include <../library/linurs/linurs_screw_dim.scad>

bracket_screw=M2_5;   // hole for the screw

bracket_gap=0.5;      // gap between bracket to make sure it fits in the box
bracket_screw_gap=0.5;// gap to fit the screw

bracket_l=pcb_w+15;   // height of bracket
bracket_l1=19;        // hole l
bracket_l2=3*screw_d[bracket_screw];
bracket_ld=pcb_wd;    // hole distance

bracket_h=10;         // depth of the U shape at the side of the screw
bracket_h1=4;         // depth of the U shape at the side where no screw is 
bracket_h2=2-bracket_gap/2;   // thickness of bracket
bracket_h3=5;         // hole h

bracket_w1=4;         // height of the mounting hole cube
bracket_tn=2;         // thickness of bracket
bracket_t=bracket_tn-bracket_gap/2;  // thickness of bracket - gap

bracket_offset_z=-10;  // bracket offset in elecbox z axis

function bracket_w(n)=step*n-bracket_gap;
function bracket_w2(n)=step*n-2*bracket_tn;
// file: ../pcb/pcb_dim.scad
// The pcb is the master object of the project
// therefore no other include files from other objects
// are necessary

// pcb constants
pcb_l =100;  // lenght of the pcb
pcb_ld = 94; // hole distance 
pcb_w=80;    // height of the pcb
pcb_wd = 67; // hole distance
pcb_wd1 = 9; // hole to edge distance 
pcb_d=3;     // diameter of holes
pcb_h=1.6;   // thickness
// main file
// FT311 module
// ==========

FT311="assembly"; // [assembly,front,back,print_front,print_back]

include <../pcb/pcb_dim.scad>
include <../bracket/bracket_dim.scad>
include <../motherboard/motherboard_dim.scad>
include <../library/linurs/linurs_screw_dim.scad>

use <../library/linurs/linurs_screw.scad>
use <../bracket/bracket.scad>
use <../pcb/pcb.scad>

module FT311_back(){
    translate([0,0,bracket_offset_z])back_bracket(n=1);
}

module FT311_front(){
    
    h1=8;
    w1=15;
    z1=22;
    
    dled=3.5;
    hled=dled/2;
    z2=43;
    z3=71;
          
    difference(){
        translate([0,0,bracket_offset_z])front_bracket(n=1);
        
        translate([
          0,
          h1/2+pcb_h,
          z1+w1/2])
        cube([
          bracket_h,
          h1,
          w1],center=true);
               
        translate([
          0,
          hled+pcb_h,
          z2])rotate([0,90,0])
        cylinder(h=bracket_h,d=dled,center=true, $fn=16); 
          
        translate([
          0,
          hled+pcb_h,
          z3])rotate([0,90,0])
        cylinder(h=bracket_h,d=dled,center=true, $fn=16); 
    }
}

module FT311_assembly(){
    pcb_assembly();
    FT311_front();
    translate([pcb_l,0,0])FT311_back();
}

if(FT311=="front"){
  FT311_front();
}

if(FT311=="back"){
  FT311_back();
}

if(FT311=="assembly"){
  FT311_assembly();
}

if(FT311=="print_front"){
  rotate([0,-90,0])
    FT311_front();
}

if(FT311=="print_back"){
  rotate([0,90,0])FT311_back();
}
